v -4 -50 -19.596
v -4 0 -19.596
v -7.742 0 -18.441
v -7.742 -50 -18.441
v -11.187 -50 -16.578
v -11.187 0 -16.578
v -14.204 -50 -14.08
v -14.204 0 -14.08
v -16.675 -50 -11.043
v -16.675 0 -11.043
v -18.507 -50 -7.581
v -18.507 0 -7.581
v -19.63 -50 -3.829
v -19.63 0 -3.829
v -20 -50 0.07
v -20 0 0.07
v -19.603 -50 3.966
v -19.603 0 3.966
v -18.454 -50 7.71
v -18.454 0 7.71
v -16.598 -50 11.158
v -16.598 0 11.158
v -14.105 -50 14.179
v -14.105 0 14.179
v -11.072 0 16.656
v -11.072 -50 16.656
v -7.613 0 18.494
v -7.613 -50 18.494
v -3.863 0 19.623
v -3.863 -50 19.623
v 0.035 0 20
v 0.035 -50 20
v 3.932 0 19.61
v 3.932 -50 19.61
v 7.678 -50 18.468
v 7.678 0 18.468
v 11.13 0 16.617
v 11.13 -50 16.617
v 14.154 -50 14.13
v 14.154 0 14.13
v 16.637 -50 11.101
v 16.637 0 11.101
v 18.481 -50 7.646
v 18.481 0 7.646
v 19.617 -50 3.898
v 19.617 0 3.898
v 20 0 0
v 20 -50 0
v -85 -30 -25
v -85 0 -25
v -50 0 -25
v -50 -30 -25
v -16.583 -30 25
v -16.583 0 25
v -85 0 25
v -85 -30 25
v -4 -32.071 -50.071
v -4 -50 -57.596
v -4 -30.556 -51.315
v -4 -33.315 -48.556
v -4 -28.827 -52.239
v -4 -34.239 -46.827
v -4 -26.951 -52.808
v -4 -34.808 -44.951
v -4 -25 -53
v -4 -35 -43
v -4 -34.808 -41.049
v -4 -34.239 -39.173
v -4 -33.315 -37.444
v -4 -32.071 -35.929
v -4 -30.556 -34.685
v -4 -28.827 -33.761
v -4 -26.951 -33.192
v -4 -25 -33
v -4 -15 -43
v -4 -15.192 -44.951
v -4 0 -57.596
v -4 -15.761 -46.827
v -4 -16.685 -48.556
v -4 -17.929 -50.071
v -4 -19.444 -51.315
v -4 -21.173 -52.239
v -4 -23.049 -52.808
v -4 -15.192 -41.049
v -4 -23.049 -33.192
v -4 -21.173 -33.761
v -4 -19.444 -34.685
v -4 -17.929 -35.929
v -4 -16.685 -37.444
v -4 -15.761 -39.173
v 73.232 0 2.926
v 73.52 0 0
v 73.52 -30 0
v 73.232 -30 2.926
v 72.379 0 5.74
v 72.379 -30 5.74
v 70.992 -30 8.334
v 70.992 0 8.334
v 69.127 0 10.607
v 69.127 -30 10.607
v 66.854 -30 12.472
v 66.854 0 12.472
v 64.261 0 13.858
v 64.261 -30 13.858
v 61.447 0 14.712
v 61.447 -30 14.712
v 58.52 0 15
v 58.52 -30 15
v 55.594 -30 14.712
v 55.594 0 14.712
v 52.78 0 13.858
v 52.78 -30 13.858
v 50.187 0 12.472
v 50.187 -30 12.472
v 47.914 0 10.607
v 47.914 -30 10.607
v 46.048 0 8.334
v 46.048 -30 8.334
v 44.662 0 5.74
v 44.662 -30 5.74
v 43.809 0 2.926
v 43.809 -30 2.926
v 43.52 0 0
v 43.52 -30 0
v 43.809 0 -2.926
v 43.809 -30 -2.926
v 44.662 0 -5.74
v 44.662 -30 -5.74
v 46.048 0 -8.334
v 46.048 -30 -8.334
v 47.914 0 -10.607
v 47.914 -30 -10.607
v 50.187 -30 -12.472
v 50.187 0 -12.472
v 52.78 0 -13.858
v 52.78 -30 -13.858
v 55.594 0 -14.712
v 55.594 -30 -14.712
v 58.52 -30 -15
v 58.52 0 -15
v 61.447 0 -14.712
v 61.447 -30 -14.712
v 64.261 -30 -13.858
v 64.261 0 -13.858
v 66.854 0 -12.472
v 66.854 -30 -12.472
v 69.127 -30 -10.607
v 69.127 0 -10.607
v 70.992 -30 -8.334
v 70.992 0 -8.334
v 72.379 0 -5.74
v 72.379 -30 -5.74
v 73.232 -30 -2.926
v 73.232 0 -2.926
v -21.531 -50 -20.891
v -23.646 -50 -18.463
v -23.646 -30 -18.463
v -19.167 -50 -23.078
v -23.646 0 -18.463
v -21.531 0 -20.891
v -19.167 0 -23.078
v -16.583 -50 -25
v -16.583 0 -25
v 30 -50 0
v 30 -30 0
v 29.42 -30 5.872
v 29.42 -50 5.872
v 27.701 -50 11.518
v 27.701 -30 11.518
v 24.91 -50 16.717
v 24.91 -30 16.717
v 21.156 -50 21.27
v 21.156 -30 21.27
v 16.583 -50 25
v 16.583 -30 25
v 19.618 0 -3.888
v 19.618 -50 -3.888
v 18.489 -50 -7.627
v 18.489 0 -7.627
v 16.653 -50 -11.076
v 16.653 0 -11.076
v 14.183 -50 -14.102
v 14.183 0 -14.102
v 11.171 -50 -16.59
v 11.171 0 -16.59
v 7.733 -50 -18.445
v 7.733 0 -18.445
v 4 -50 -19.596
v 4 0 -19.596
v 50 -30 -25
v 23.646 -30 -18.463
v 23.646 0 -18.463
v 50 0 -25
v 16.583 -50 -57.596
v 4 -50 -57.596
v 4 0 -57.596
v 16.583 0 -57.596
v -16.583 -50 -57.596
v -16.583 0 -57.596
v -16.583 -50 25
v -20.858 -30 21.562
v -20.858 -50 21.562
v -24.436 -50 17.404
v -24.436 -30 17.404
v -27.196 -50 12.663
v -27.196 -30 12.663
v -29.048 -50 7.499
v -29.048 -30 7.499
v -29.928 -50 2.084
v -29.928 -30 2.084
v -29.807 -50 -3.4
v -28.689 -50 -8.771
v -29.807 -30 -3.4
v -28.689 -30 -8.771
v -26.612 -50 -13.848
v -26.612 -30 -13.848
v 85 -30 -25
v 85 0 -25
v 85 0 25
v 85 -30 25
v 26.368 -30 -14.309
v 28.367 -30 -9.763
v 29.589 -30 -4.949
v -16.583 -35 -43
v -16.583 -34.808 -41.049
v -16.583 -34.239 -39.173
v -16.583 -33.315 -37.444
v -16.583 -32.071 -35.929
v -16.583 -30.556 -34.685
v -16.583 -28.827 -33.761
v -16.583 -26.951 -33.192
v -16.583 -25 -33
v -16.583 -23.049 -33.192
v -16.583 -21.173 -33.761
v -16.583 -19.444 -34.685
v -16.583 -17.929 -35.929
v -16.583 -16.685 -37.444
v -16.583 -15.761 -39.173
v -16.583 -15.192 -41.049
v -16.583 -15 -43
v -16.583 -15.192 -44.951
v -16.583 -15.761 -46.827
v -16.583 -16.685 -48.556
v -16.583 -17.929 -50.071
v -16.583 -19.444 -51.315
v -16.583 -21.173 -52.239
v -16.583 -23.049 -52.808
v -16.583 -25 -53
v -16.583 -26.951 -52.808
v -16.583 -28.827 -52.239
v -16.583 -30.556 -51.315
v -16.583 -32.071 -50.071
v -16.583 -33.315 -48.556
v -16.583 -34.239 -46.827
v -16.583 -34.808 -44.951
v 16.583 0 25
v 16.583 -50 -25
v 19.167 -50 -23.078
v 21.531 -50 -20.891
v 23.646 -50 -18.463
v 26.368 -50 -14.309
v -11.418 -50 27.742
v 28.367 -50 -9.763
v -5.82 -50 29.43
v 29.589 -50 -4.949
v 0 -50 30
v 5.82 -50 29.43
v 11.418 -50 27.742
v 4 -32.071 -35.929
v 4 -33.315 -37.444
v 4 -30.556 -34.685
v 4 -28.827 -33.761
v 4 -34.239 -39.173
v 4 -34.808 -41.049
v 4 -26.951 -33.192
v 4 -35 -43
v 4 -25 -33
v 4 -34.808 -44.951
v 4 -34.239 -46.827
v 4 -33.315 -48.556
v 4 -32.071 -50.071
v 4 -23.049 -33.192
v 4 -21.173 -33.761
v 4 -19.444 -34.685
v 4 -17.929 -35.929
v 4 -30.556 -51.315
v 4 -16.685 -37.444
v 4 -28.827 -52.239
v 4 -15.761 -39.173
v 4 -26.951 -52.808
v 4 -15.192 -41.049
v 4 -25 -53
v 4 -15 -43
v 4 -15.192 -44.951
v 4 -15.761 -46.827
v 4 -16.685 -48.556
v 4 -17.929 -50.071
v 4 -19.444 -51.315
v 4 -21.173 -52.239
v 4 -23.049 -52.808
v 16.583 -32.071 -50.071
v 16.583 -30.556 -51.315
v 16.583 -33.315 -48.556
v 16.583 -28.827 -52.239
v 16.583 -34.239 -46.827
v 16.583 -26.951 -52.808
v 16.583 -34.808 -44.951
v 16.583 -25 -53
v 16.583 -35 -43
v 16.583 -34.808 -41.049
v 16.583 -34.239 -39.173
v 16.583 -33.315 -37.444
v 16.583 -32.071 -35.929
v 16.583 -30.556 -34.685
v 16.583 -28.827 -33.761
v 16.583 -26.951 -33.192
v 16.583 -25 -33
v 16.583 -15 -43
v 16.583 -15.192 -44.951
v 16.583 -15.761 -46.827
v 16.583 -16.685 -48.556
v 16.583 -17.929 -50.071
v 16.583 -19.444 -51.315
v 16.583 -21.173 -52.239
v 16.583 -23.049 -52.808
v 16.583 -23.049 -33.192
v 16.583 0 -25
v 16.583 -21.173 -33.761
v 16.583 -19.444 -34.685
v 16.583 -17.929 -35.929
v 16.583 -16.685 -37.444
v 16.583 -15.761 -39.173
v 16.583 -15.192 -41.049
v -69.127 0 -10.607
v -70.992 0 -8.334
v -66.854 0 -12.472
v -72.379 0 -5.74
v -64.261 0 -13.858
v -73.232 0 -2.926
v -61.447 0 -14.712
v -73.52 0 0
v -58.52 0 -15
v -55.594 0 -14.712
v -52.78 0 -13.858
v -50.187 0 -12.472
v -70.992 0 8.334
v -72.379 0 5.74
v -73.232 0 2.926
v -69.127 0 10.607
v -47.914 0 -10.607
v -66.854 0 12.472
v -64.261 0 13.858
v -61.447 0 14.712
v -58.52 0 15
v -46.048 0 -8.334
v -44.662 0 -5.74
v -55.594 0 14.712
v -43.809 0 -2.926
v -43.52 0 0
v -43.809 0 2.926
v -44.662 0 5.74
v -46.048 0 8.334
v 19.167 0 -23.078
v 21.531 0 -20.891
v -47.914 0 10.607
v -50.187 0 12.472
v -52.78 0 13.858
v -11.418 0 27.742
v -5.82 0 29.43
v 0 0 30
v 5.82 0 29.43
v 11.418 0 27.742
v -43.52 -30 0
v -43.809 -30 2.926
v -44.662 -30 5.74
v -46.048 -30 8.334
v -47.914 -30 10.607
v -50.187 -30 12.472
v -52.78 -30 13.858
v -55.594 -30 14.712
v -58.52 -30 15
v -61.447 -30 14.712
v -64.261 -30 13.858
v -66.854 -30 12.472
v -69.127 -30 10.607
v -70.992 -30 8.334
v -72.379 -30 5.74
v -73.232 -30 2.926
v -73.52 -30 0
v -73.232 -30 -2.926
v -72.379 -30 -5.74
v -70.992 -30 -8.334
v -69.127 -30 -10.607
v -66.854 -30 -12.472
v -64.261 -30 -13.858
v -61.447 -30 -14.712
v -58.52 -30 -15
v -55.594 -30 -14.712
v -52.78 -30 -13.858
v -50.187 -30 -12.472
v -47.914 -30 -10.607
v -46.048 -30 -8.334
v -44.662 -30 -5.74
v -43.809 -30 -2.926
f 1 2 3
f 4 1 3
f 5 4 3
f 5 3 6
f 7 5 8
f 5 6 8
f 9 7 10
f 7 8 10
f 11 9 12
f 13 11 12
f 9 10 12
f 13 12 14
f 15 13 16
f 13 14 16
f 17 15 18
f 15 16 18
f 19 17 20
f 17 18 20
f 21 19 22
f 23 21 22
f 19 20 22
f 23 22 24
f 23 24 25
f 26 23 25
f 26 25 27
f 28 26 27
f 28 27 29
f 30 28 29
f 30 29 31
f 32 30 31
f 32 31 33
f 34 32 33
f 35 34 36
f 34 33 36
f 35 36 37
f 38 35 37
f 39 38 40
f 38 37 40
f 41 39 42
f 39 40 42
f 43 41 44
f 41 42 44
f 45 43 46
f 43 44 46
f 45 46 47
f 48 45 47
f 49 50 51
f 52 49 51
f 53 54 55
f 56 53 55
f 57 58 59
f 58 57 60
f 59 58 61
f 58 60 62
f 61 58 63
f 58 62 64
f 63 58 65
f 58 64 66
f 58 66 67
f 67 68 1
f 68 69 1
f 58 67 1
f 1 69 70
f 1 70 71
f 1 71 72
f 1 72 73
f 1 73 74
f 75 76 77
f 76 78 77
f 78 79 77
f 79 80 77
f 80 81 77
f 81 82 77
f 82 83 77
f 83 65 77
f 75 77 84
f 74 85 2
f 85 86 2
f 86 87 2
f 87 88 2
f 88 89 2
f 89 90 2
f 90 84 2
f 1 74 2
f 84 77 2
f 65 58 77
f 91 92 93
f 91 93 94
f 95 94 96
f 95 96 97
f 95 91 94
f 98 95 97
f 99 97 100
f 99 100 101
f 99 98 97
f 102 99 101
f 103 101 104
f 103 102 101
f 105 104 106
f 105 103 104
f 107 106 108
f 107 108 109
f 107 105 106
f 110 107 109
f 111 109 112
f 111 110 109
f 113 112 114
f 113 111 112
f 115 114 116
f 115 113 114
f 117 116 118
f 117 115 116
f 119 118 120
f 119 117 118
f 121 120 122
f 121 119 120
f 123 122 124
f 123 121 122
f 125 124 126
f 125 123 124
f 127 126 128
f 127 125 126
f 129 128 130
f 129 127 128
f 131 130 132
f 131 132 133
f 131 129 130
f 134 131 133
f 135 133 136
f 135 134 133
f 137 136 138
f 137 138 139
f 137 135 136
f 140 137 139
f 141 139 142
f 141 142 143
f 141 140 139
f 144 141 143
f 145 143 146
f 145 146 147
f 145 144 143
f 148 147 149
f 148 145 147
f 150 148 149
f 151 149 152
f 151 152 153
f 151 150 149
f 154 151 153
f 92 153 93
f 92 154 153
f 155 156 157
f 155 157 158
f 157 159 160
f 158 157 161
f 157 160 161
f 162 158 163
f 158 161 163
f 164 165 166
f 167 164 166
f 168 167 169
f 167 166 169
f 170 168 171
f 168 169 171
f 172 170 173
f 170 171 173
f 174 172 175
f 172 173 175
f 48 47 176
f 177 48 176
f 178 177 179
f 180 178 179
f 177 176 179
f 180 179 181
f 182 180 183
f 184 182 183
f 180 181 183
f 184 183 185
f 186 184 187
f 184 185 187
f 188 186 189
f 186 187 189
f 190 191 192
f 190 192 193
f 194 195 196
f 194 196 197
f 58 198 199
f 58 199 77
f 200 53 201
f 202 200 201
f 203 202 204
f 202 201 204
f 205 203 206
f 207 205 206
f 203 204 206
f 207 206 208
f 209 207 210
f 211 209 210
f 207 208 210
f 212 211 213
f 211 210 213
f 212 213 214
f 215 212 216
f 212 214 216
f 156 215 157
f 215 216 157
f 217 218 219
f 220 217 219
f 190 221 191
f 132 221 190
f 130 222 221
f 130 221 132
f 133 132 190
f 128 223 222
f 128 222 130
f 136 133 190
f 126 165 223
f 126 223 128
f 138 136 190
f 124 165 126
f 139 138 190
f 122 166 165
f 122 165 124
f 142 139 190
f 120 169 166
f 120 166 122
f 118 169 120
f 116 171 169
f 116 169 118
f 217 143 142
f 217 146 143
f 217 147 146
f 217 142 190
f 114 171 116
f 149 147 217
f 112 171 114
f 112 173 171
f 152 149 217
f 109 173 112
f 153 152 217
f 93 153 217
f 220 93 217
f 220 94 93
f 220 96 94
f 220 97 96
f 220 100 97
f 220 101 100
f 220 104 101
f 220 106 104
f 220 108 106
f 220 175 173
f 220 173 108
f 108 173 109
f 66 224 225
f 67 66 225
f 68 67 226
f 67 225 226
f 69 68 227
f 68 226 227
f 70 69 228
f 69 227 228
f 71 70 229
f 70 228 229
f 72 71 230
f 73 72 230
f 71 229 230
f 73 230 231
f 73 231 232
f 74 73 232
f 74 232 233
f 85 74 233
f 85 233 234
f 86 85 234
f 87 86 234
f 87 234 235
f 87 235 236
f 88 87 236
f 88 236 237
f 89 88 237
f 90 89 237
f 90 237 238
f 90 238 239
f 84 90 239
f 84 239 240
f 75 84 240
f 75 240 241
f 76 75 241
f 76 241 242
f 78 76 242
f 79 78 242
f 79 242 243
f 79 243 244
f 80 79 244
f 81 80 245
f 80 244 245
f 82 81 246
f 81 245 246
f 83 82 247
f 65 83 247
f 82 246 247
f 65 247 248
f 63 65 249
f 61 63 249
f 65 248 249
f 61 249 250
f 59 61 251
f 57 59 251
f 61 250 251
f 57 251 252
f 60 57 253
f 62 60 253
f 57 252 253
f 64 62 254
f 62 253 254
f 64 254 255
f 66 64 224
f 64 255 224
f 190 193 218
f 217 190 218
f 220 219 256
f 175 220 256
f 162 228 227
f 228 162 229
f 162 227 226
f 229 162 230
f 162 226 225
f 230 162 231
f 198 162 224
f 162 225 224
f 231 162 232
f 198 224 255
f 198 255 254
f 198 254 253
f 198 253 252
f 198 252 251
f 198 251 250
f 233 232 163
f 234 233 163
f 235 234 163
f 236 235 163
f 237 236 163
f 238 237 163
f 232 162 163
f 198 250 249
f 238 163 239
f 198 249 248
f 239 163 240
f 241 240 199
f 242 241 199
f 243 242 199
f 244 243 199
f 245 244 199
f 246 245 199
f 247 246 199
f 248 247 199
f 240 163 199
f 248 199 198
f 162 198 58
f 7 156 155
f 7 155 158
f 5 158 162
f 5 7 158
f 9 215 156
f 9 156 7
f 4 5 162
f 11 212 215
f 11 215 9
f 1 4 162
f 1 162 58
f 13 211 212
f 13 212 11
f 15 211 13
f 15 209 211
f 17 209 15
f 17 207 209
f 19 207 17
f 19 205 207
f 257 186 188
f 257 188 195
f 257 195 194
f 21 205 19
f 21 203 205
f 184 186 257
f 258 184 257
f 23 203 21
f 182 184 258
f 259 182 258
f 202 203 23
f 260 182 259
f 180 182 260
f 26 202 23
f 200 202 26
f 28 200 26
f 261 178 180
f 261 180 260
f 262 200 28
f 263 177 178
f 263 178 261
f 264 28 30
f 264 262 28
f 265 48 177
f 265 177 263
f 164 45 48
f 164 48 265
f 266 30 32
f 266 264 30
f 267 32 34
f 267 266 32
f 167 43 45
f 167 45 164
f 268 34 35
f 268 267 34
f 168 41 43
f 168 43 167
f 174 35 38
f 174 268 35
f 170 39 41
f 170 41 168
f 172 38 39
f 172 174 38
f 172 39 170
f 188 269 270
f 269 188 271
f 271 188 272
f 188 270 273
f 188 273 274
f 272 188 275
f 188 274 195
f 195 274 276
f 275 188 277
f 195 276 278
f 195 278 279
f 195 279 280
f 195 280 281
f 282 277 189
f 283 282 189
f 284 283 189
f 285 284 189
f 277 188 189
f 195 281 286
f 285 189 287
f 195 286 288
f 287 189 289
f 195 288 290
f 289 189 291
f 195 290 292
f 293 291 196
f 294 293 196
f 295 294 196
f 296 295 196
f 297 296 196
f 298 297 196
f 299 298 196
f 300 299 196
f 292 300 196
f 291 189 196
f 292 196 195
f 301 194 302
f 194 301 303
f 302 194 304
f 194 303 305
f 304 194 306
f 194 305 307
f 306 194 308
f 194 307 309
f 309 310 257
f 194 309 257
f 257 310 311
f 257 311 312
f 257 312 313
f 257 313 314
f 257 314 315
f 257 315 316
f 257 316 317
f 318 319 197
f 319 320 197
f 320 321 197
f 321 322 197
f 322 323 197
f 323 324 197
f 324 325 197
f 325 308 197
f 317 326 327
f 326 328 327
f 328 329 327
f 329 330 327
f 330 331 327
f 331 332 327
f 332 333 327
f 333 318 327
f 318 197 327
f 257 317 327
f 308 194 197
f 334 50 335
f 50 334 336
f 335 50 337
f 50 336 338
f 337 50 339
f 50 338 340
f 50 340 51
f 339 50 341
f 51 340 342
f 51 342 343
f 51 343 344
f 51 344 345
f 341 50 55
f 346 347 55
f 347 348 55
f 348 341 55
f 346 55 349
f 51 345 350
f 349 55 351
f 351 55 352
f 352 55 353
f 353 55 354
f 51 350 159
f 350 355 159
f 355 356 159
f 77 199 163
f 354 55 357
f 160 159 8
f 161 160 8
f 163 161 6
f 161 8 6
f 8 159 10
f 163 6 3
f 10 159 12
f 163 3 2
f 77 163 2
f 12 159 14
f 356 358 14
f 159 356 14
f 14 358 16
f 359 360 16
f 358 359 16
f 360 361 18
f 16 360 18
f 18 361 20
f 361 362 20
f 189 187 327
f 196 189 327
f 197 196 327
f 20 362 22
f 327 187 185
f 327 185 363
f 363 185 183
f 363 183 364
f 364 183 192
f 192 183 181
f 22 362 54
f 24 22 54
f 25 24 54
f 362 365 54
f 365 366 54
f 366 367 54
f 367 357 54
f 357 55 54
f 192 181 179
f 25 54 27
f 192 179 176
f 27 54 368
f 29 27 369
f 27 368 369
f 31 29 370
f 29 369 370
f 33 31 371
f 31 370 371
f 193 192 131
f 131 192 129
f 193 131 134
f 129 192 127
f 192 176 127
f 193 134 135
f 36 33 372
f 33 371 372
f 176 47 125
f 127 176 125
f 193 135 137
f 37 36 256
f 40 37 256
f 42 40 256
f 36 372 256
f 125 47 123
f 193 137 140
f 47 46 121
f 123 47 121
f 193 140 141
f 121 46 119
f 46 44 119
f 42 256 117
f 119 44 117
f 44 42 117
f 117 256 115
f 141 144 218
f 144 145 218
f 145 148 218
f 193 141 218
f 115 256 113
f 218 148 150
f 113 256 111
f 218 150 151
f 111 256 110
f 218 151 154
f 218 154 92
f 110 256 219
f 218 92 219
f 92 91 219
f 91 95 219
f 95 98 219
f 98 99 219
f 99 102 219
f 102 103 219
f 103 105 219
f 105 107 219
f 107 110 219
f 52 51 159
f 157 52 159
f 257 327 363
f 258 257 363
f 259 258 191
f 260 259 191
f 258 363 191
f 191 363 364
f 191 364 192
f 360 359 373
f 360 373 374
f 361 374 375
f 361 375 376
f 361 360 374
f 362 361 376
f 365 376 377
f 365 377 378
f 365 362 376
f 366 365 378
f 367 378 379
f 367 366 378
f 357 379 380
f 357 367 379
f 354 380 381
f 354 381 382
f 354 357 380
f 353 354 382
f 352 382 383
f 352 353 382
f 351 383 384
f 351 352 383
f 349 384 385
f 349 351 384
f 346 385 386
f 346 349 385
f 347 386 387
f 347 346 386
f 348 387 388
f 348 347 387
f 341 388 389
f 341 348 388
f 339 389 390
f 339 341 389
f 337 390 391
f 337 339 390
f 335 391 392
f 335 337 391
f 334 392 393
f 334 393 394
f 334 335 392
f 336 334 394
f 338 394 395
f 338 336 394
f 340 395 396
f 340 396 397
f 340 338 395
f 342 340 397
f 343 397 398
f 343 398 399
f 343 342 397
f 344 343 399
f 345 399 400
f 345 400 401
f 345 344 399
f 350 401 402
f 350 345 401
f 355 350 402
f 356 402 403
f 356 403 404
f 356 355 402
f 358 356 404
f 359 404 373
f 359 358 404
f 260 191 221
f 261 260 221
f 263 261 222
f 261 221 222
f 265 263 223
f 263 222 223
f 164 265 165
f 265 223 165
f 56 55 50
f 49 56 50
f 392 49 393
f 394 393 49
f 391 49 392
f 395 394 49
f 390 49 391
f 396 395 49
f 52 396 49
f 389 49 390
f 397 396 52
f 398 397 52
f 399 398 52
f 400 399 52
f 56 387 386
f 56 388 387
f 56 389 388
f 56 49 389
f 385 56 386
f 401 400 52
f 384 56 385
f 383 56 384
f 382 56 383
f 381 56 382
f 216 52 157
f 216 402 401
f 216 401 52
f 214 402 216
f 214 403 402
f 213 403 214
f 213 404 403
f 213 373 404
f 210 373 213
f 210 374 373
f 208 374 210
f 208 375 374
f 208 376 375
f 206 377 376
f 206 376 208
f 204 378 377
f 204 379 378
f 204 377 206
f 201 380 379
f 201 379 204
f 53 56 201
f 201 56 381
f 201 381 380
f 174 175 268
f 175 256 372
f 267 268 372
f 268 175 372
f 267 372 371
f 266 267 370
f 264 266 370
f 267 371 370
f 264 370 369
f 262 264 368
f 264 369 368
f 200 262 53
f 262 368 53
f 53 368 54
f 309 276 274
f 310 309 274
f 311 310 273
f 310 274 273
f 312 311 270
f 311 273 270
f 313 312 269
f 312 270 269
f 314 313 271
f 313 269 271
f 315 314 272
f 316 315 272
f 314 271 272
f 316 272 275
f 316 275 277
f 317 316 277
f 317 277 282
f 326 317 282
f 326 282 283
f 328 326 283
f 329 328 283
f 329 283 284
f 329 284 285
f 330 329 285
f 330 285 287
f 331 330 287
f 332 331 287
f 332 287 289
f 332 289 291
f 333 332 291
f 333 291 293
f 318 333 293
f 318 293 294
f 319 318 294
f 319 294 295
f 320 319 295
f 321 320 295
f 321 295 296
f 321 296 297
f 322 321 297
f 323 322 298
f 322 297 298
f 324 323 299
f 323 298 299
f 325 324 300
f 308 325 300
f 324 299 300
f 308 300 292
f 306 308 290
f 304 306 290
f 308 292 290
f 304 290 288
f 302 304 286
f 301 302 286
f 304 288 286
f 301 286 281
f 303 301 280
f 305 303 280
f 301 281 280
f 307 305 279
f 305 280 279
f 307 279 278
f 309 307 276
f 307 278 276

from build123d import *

# Parameters (mm, degrees)
F1_DEPTH = 50
F0_R     = 15
F2_DEPTH = 30
F3_R     = 10
F4_DEPTH = 42.2


with BuildPart() as f1:
    # F0 (on Front) → F1 (new body)
    with BuildSketch(Plane.XZ):
        with BuildLine():
            ThreePointArc((-4, -19.5959179423), (-12.6491106407, 15.4919333848), (20, 0))
            ThreePointArc((20, 0), (15.4919333848, -12.6491106407), (4, -19.5959179423))
            Line((4, -19.5959179423), (4, -25))
            Line((4, -25), (16.5831239518, -25))
            ThreePointArc((16.5831239518, -25), (20.3783390562, -22.0164324383), (23.6458608502, -18.4627534418))
            ThreePointArc((23.6458608502, -18.4627534418), (28.36702157, -9.7627909558), (30, 0))
            ThreePointArc((30, 0), (26.4338203685, 14.1863716546), (16.5831239518, 25))
            Line((16.5831239518, 25), (-16.5831239518, 25))
            ThreePointArc((-16.5831239518, 25), (-29.6115777819, 4.8119082768), (-23.6458608502, -18.4627534418))
            ThreePointArc((-23.6458608502, -18.4627534418), (-20.3783390562, -22.0164324383), (-16.5831239518, -25))
            Line((-16.5831239518, -25), (-4, -25))
            Line((-4, -25), (-4, -19.5959179423))
        make_face()
        with BuildLine():
            ThreePointArc((16.5831239518, 25), (0, 30), (-16.5831239518, 25))
            Line((-16.5831239518, 25), (16.5831239518, 25))
        make_face()
        with BuildLine():
            Line((16.5831239518, -57.5959179423), (16.5831239518, -25))
            ThreePointArc((16.5831239518, -25), (10.5600439971, -28.079983454), (4, -29.7321374946))
            Line((4, -29.7321374946), (4, -57.5959179423))
            Line((4, -57.5959179423), (16.5831239518, -57.5959179423))
        make_face()
        with BuildLine():
            Line((16.5831239518, -25), (4, -25))
            Line((4, -25), (4, -29.7321374946))
            ThreePointArc((4, -29.7321374946), (10.5600439971, -28.079983454), (16.5831239518, -25))
        make_face()
        with BuildLine():
            ThreePointArc((-4, -29.7321374946), (-10.5600439971, -28.079983454), (-16.5831239518, -25))
            Line((-16.5831239518, -25), (-16.5831239518, -57.5959179423))
            Line((-16.5831239518, -57.5959179423), (-4, -57.5959179423))
            Line((-4, -57.5959179423), (-4, -29.7321374946))
        make_face()
        with BuildLine():
            Line((-4, -29.7321374946), (-4, -25))
            Line((-4, -25), (-16.5831239518, -25))
            ThreePointArc((-16.5831239518, -25), (-10.5600439971, -28.079983454), (-4, -29.7321374946))
        make_face()
    extrude(amount=F1_DEPTH)

    # F0 (on Front) → F2 (join)
    with BuildSketch(Plane.XZ):
        with BuildLine():
            Line((-50, -25), (-23.6458608502, -18.4627534418))
            ThreePointArc((-23.6458608502, -18.4627534418), (-29.6115777819, 4.8119082768), (-16.5831239518, 25))
            Line((-16.5831239518, 25), (-85, 25))
            Line((-85, 25), (-85, -25))
            Line((-85, -25), (-50, -25))
        make_face()
        with Locations((-58.52034688, 0)):
            Circle(F0_R, mode=Mode.SUBTRACT)
        with BuildLine():
            ThreePointArc((30, 0), (28.36702157, -9.7627909558), (23.6458608502, -18.4627534418))
            Line((23.6458608502, -18.4627534418), (50, -25))
            Line((50, -25), (85, -25))
            Line((85, -25), (85, 25))
            Line((85, 25), (16.5831239518, 25))
            ThreePointArc((16.5831239518, 25), (26.4338203685, 14.1863716546), (30, 0))
        make_face()
        with Locations((58.52034688, 0)):
            Circle(F0_R, mode=Mode.SUBTRACT)
    extrude(amount=F2_DEPTH)

    # F3 (on face) → F4 (cut)
    with BuildSketch(Plane(origin=(-16.5831239518, 0, 0), x_dir=(0, -1, 0), z_dir=(-1, 0, 0))):
        with Locations((25, -43)):
            Circle(F3_R)
    extrude(amount=-F4_DEPTH, mode=Mode.SUBTRACT)


solid = f1.part
